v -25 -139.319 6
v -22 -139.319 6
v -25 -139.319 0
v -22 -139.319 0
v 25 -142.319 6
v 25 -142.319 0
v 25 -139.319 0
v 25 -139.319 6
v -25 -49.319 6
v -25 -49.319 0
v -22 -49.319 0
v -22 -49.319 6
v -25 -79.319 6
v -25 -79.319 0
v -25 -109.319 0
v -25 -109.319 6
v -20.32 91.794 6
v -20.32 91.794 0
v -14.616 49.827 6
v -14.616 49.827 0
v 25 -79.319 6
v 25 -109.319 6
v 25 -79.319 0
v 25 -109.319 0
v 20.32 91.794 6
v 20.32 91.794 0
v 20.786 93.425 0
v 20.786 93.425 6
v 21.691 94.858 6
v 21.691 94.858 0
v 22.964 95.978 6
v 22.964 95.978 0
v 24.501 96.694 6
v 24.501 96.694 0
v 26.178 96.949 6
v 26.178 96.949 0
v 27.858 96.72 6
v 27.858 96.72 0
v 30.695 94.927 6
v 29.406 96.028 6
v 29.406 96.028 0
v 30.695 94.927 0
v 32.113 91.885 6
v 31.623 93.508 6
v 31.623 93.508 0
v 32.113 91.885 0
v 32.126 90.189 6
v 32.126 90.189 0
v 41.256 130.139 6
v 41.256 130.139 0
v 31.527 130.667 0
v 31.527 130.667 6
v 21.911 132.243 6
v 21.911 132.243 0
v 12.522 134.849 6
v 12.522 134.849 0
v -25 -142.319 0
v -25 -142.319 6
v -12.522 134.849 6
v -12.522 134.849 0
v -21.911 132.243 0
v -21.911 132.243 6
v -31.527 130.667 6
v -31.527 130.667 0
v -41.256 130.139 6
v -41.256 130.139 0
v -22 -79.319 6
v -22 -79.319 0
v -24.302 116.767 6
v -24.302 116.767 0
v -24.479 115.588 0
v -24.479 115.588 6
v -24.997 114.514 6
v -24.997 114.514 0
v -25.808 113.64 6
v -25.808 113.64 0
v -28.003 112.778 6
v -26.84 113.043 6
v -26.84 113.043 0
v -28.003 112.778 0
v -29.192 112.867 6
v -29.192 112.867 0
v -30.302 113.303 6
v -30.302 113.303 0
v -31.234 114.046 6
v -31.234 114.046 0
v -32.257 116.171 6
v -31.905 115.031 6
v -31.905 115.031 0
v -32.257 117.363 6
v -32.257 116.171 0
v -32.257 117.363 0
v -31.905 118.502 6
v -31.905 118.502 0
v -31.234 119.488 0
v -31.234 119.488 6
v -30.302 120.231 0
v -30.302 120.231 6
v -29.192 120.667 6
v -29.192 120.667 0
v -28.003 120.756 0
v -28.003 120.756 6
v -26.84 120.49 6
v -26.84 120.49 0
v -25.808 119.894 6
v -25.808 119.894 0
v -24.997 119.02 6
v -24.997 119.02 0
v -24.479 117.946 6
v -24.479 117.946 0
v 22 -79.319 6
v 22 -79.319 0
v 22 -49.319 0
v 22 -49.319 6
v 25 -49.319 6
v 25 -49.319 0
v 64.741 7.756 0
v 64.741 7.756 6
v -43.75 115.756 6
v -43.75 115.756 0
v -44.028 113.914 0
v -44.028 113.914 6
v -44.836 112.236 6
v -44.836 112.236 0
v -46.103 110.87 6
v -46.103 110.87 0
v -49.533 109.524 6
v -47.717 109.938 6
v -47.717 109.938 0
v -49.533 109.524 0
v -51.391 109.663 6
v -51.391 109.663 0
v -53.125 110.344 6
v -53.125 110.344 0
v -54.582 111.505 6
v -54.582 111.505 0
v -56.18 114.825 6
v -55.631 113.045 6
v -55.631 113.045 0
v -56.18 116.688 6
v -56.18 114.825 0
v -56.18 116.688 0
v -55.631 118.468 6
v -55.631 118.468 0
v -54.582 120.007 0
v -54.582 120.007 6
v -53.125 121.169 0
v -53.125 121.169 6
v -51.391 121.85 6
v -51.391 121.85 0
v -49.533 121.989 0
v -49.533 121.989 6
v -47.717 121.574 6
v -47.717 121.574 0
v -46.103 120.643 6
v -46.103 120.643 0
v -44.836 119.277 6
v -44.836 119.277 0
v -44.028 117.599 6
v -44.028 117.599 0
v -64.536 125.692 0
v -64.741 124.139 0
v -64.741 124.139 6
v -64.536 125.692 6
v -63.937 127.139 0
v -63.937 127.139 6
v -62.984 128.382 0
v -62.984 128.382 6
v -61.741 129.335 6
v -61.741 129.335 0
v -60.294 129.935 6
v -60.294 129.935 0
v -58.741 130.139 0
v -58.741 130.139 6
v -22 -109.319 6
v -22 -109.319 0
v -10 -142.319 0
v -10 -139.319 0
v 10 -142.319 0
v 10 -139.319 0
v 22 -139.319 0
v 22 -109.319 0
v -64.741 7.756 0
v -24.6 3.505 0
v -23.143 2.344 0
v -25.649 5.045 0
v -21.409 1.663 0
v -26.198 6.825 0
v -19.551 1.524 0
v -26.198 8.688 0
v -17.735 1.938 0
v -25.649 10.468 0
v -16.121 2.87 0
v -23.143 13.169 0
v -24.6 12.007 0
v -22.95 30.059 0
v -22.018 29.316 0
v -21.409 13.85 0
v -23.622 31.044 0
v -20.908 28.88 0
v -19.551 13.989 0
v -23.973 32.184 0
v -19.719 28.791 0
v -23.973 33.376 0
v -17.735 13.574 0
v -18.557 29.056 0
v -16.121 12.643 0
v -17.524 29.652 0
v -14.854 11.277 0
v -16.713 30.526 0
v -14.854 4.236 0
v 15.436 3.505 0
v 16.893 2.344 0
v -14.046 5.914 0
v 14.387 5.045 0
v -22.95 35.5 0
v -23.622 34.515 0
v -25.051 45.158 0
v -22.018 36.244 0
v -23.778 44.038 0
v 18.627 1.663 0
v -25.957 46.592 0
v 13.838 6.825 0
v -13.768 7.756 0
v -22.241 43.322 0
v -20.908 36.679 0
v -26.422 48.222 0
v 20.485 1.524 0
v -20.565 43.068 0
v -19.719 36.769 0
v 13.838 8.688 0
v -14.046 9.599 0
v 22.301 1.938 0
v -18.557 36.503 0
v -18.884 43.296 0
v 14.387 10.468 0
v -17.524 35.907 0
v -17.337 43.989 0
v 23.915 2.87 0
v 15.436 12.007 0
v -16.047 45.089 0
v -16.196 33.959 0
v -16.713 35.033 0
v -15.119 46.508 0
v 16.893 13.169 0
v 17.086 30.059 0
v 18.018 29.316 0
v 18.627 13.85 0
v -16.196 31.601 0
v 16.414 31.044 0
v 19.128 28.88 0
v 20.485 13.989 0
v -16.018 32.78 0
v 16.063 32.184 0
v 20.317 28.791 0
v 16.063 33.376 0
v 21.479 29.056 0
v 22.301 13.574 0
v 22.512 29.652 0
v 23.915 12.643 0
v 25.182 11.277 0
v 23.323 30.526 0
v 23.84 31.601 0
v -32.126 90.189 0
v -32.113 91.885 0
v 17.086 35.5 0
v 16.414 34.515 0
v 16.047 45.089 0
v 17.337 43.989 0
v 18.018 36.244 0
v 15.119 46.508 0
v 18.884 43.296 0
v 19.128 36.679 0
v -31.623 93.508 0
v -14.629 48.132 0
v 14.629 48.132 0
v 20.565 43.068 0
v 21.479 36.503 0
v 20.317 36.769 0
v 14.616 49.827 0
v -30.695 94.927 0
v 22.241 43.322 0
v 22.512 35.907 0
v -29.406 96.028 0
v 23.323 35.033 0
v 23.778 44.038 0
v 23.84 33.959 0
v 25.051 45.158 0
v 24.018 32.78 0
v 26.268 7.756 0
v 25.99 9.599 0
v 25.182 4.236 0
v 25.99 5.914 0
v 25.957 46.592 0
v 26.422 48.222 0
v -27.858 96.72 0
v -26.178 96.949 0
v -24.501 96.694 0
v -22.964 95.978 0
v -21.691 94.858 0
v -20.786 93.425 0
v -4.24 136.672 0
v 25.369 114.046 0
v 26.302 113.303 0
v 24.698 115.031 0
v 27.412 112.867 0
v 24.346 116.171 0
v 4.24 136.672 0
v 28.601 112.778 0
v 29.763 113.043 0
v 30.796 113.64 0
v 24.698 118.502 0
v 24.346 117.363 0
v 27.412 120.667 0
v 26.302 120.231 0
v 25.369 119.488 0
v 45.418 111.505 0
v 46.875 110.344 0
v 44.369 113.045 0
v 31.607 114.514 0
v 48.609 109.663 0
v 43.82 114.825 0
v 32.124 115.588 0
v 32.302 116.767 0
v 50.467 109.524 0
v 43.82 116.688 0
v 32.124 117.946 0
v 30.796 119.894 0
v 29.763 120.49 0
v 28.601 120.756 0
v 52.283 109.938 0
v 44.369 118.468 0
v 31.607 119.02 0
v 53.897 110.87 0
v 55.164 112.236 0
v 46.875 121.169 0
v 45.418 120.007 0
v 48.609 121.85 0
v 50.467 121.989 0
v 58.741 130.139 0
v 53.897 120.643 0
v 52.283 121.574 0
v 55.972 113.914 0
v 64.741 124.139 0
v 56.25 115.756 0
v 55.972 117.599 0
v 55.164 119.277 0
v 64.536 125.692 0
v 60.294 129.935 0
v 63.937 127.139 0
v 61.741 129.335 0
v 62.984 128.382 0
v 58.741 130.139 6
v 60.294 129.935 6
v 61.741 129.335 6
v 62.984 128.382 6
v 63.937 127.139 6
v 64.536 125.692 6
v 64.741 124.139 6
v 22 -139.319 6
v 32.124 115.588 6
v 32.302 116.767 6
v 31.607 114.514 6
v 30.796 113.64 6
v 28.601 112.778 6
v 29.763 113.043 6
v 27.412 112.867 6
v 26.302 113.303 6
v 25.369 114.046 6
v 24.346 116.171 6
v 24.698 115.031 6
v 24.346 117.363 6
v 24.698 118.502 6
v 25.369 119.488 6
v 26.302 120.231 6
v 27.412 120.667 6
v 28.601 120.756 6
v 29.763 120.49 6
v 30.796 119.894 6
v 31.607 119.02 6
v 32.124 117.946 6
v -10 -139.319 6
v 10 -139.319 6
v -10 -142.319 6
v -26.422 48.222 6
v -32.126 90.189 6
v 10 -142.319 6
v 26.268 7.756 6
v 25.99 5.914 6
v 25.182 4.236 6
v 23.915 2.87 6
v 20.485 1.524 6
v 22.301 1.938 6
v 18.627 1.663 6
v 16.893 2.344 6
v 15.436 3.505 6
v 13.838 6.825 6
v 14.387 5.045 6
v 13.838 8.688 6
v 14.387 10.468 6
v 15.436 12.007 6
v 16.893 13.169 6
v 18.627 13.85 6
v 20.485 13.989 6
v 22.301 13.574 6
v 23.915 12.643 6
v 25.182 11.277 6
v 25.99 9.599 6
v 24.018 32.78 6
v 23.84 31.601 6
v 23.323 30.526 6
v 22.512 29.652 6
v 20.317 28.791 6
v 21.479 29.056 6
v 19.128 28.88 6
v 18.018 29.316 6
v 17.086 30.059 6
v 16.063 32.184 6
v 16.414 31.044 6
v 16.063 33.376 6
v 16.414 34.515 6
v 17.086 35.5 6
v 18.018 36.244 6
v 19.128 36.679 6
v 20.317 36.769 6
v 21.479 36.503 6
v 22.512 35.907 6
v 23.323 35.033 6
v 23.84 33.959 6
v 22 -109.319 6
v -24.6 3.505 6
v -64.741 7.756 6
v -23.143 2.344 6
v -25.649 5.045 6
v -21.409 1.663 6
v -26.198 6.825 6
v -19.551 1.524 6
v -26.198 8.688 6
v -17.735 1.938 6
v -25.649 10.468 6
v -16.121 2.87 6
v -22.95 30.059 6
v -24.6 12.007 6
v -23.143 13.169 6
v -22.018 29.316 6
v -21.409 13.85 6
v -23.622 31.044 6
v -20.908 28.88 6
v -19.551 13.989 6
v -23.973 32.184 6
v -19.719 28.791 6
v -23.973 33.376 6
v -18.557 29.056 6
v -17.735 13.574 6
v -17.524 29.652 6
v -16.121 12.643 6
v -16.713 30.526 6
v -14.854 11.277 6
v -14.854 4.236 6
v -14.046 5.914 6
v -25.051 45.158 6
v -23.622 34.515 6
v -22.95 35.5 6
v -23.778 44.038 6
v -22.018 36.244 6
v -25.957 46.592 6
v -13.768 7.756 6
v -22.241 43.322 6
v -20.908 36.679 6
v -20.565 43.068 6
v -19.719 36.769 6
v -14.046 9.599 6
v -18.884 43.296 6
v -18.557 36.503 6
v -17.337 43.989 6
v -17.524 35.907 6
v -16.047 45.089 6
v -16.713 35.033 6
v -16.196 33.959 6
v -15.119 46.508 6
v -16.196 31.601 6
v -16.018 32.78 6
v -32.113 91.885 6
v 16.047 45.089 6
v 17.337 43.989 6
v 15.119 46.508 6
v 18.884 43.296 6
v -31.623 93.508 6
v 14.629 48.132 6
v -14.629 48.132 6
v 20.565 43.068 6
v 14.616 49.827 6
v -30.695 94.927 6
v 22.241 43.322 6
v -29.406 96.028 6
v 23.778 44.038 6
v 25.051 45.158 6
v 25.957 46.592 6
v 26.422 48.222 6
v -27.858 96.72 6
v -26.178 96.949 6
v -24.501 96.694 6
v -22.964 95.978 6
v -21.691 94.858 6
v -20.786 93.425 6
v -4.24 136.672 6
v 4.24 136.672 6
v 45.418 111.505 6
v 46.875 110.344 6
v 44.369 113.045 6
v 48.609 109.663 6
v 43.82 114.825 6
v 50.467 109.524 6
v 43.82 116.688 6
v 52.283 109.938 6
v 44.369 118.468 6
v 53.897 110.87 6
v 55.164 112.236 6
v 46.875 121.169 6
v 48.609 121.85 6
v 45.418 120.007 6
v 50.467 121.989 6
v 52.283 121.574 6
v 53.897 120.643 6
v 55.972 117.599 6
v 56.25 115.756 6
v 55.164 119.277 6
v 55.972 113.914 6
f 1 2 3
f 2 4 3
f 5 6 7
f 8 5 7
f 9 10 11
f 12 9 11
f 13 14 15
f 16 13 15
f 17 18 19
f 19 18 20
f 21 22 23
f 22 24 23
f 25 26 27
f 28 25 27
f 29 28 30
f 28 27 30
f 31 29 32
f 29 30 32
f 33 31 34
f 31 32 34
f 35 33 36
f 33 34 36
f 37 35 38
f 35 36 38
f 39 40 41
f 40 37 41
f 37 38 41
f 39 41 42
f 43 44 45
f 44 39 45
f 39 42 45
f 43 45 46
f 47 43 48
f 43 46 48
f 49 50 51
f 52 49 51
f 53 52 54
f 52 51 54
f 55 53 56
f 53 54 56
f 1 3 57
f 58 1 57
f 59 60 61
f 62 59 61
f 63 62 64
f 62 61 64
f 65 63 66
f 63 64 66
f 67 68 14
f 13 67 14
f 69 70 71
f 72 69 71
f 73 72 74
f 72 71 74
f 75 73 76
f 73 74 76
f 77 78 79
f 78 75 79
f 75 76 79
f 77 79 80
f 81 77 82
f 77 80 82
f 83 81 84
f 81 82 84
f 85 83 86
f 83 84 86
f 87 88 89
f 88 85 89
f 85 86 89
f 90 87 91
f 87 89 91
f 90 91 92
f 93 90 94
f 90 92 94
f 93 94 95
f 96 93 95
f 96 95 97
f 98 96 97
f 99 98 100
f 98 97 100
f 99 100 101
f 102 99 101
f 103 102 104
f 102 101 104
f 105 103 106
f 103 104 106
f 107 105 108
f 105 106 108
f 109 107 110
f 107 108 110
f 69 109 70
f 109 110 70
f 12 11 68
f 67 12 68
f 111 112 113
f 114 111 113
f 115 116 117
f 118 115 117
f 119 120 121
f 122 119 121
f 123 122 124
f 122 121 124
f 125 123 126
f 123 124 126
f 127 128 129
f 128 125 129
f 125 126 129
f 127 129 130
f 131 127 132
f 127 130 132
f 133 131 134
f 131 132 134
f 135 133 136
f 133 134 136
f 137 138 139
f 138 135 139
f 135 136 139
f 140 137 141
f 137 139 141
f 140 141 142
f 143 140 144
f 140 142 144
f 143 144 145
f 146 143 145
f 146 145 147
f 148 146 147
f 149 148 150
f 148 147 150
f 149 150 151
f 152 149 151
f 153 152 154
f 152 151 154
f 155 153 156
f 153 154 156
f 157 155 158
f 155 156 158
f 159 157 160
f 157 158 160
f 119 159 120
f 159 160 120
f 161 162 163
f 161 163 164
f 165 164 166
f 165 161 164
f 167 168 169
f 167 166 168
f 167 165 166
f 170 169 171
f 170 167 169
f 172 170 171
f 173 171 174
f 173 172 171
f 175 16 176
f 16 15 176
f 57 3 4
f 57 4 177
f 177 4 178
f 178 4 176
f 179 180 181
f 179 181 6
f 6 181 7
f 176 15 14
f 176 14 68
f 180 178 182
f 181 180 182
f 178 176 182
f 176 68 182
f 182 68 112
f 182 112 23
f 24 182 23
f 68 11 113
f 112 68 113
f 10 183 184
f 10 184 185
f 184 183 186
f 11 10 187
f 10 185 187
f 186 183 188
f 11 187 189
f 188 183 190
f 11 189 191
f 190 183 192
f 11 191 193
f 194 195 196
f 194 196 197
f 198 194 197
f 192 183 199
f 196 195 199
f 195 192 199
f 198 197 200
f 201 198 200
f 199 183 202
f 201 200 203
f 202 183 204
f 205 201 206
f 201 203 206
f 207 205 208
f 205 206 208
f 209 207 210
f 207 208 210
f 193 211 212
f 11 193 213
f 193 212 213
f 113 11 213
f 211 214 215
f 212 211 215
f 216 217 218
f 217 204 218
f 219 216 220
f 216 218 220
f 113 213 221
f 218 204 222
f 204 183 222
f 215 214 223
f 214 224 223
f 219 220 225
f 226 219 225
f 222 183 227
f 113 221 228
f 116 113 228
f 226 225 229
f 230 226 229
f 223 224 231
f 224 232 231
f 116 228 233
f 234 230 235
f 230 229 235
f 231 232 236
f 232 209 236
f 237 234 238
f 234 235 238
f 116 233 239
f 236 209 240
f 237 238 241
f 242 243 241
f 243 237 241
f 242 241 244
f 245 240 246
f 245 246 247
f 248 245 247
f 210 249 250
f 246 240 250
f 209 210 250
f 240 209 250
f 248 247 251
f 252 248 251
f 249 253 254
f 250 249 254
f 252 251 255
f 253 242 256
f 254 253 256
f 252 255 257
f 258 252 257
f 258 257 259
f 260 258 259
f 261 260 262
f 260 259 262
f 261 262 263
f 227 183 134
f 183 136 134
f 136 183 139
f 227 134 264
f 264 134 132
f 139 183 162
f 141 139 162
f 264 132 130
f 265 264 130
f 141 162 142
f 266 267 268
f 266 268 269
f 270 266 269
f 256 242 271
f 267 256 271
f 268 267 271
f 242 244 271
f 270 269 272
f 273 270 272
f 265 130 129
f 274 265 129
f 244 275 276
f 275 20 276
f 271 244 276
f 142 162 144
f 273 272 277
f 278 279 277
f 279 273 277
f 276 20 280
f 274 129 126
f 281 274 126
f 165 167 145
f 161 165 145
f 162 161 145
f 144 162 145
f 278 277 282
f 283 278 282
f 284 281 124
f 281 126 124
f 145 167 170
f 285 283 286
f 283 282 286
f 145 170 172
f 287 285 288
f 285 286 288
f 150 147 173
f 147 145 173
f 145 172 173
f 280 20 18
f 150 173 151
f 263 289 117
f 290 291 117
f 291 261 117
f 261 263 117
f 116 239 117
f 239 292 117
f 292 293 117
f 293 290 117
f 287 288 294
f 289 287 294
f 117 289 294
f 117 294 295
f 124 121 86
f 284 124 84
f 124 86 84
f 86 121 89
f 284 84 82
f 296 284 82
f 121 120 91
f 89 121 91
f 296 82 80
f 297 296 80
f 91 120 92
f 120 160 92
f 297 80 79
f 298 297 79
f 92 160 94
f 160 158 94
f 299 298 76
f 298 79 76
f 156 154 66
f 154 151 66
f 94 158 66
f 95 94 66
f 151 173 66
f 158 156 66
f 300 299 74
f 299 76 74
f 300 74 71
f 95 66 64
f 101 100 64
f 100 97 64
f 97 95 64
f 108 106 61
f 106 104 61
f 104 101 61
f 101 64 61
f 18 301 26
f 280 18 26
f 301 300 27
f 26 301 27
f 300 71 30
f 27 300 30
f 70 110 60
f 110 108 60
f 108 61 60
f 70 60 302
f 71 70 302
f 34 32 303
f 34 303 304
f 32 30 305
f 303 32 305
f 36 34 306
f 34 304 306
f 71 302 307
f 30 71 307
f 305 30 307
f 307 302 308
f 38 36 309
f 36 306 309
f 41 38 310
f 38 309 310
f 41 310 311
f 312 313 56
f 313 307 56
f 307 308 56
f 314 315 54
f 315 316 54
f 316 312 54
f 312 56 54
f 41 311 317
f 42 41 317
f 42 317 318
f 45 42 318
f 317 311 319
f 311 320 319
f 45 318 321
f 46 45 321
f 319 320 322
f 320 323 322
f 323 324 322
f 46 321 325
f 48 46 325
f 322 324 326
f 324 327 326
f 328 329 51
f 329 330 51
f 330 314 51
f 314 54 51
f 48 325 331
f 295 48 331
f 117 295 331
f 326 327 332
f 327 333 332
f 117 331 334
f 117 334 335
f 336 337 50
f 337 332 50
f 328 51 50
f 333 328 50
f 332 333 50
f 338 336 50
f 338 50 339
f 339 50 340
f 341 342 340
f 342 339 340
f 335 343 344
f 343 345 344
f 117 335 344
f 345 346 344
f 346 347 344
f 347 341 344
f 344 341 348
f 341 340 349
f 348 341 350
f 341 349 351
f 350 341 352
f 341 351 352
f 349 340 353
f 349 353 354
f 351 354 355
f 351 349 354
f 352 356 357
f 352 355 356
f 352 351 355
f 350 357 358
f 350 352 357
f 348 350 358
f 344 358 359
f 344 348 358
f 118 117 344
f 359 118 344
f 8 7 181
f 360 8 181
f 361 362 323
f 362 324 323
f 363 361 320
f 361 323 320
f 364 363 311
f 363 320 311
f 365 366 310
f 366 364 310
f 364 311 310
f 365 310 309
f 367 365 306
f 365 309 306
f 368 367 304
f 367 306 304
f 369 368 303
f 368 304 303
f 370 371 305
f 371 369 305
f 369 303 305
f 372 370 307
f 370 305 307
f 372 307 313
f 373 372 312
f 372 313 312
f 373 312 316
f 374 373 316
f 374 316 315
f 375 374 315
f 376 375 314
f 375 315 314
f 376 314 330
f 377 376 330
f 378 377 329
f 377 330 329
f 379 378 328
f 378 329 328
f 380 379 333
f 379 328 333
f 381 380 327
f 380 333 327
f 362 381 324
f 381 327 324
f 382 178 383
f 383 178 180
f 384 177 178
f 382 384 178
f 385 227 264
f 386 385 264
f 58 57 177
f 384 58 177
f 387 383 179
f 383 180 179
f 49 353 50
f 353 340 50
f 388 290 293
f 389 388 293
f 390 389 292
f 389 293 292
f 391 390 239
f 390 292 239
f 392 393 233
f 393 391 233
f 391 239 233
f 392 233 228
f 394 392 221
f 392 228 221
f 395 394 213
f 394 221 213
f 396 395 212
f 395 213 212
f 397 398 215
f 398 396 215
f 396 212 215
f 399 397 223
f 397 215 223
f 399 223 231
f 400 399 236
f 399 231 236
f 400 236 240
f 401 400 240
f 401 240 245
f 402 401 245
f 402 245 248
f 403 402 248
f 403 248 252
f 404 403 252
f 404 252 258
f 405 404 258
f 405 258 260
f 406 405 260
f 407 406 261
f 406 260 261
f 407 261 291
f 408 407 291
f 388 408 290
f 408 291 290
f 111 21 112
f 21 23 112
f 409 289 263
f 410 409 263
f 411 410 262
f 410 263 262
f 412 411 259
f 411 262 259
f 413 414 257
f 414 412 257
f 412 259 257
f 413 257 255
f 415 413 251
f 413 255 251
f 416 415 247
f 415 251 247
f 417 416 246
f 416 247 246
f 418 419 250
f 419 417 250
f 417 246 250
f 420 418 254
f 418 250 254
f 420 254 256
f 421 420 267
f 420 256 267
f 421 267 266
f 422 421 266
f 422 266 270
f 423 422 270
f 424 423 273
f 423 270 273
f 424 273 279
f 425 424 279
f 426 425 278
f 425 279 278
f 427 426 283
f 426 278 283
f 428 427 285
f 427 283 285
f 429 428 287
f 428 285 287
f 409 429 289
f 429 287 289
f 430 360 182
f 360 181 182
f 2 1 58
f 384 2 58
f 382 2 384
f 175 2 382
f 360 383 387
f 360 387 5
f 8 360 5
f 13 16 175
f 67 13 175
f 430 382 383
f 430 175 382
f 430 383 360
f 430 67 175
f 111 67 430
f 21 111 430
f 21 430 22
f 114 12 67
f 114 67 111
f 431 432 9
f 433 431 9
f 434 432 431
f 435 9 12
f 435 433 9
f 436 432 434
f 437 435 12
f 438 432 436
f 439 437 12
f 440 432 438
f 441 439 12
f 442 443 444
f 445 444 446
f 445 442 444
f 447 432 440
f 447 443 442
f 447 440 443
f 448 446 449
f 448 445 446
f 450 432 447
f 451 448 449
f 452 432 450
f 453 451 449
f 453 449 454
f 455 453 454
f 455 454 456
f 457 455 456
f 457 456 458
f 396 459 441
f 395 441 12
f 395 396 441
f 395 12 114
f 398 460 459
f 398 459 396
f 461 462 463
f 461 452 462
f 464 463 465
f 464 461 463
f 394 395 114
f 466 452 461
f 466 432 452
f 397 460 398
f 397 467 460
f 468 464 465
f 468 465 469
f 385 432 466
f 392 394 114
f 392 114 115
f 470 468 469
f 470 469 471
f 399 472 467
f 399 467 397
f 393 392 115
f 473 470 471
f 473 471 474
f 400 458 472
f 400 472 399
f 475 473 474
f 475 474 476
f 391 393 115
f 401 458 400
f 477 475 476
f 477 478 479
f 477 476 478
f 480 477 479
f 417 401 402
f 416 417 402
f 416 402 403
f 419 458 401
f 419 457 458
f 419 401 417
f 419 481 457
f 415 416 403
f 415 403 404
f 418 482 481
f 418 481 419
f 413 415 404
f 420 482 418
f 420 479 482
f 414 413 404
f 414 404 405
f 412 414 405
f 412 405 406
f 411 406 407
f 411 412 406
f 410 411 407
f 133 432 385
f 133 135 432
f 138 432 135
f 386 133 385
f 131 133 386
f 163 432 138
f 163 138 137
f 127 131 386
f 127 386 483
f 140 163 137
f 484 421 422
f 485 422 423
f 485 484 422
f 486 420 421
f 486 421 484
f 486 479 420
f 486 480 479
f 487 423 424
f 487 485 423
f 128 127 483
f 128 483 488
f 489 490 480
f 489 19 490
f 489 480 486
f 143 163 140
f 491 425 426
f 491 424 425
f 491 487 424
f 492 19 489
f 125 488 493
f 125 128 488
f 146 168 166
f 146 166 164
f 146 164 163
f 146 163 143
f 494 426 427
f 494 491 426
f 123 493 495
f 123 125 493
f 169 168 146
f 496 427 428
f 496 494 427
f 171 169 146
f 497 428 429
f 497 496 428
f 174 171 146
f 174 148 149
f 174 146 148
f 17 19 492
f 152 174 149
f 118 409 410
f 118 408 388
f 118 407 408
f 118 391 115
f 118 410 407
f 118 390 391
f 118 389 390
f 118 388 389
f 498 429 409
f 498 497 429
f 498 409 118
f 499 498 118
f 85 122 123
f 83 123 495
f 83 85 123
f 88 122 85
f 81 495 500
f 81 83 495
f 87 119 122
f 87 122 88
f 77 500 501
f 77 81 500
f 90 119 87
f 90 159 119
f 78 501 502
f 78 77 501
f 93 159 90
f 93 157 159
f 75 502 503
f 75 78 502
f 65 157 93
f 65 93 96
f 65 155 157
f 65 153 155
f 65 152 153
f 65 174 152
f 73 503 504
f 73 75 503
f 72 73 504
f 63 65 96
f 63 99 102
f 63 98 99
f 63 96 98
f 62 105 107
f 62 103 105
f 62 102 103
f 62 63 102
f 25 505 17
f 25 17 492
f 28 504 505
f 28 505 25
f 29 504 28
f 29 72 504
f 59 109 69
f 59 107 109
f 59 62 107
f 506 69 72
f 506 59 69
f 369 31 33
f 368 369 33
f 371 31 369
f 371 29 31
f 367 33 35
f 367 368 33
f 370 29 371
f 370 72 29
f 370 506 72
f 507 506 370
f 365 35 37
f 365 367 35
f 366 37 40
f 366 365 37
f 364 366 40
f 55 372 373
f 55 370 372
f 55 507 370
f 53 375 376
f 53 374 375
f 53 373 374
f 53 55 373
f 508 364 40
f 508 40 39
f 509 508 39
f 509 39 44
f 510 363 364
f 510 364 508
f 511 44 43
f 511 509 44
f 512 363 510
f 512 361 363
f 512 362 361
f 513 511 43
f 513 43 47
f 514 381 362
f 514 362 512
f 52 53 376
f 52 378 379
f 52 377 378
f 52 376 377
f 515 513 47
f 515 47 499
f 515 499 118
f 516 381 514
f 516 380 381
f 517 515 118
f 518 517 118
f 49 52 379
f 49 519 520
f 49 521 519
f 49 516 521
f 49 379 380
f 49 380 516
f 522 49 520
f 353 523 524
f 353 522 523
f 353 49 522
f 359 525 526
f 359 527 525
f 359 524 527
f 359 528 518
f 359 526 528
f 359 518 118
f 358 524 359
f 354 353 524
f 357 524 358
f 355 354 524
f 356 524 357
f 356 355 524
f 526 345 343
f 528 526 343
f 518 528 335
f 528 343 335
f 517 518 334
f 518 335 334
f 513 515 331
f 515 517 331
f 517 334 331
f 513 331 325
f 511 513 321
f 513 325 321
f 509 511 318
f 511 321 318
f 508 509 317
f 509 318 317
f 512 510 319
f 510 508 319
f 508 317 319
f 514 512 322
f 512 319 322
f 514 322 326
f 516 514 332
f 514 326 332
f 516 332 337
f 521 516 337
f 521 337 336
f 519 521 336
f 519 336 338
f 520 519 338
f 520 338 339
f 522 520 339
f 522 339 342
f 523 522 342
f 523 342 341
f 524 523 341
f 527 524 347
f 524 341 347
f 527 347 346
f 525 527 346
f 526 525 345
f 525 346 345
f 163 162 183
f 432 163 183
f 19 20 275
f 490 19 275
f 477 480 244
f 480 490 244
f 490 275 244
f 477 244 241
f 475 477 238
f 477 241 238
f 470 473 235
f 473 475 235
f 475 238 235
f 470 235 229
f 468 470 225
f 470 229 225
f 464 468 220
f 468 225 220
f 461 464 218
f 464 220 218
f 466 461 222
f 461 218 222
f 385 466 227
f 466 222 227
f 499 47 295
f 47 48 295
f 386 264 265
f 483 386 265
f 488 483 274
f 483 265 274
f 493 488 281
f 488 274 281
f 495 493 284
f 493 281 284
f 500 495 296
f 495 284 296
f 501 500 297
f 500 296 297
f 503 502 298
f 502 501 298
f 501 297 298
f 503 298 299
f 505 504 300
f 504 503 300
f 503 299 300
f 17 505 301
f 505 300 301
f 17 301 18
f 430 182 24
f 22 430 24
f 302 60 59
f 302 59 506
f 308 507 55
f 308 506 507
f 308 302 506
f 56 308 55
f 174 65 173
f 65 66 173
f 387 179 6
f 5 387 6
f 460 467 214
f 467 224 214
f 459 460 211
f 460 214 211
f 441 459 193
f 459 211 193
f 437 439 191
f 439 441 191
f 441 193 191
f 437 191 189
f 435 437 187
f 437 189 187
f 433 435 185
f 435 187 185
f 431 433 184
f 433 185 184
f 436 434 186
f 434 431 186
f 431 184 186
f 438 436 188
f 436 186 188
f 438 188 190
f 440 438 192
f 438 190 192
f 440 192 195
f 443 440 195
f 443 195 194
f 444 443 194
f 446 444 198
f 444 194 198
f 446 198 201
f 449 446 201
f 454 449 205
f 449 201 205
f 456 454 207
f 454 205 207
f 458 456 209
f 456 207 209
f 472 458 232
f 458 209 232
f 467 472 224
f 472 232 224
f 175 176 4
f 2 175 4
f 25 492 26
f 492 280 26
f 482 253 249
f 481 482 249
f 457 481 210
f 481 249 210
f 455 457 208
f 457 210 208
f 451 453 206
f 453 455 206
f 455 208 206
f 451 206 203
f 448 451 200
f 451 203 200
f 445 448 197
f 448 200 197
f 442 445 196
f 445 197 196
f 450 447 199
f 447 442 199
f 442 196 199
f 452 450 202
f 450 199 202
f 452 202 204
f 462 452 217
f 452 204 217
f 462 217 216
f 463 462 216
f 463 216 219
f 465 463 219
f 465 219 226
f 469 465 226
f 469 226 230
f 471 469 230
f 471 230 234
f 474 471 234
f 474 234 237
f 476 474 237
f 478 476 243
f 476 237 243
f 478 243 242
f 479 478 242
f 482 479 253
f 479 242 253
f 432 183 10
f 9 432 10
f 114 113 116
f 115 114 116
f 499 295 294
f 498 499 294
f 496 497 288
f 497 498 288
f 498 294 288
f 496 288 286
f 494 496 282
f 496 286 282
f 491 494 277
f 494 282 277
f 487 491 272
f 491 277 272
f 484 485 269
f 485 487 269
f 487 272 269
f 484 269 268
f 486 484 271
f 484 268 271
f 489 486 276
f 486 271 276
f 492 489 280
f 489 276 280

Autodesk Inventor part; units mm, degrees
ref_plane "YZ Plane" through (0, 0, 0) normal (1, 0, 0) x (0, 1, 0)
ref_plane "XZ Plane" through (0, 0, 0) normal (0, 1, 0) x (-1, 0, 0)
ref_plane "XY Plane" through (0, 0, 0) normal (0, 0, 1) x (1, 0, 0)
sketch "Sketch1" plane through (0, 0, 0) normal (0, 0, 1) x (1, 0, 0)
  line L0 (-10, -142.3192) -> (-10, -139.3192) projected
  line L1 (-10, -139.3192) -> (10, -139.3192) projected
  line L2 (10, -139.3192) -> (10, -142.3192) projected
  line L3 (10, -142.3192) -> (25, -142.3192) projected
  line L4 (25, -142.3192) -> (25, -139.3192) projected
  line L5 (25, -139.3192) -> (22, -139.3192) projected
  line L6 (22, -139.3192) -> (22, -109.3192) projected
  line L7 (22, -109.3192) -> (25, -109.3192) projected
  line L8 (25, -109.3192) -> (25, -79.3192) projected
  line L9 (25, -79.3192) -> (22, -79.3192) projected
  line L10 (22, -79.3192) -> (22, -49.3192) projected
  line L11 (22, -49.3192) -> (25, -49.3192) projected
  line L12 (25, -49.3192) -> (64.7409, 7.7563) projected
  line L13 (64.7409, 7.7563) -> (64.7409, 124.1392) projected
  arc A0 (64.7409, 124.1392) -> (58.7409, 130.1392) centre (58.7409, 124.1392) ccw projected
  line L14 (58.7409, 130.1392) -> (41.2562, 130.1392) projected
  arc A1 (12.5221, 134.8494) -> (41.2562, 130.1392) centre (41.2562, 220.1392) ccw projected
  arc A2 (12.5221, 134.8494) -> (-12.5221, 134.8494) centre (0, 97.6808) ccw projected
  arc A3 (-41.2562, 130.1392) -> (-12.5221, 134.8494) centre (-41.2562, 220.1392) ccw projected
  line L15 (-41.2562, 130.1392) -> (-58.7409, 130.1392) projected
  arc A4 (-58.7409, 130.1392) -> (-64.7409, 124.1392) centre (-58.7409, 124.1392) ccw projected
  line L16 (-64.7409, 124.1392) -> (-64.7409, 7.7563) projected
  line L17 (-64.7409, 7.7563) -> (-25, -49.3192) projected
  line L18 (-25, -49.3192) -> (-22, -49.3192) projected
  line L19 (-22, -49.3192) -> (-22, -79.3192) projected
  line L20 (-22, -79.3192) -> (-25, -79.3192) projected
  line L21 (-25, -79.3192) -> (-25, -109.3192) projected
  line L22 (-25, -109.3192) -> (-22, -109.3192) projected
  line L23 (-22, -109.3192) -> (-22, -139.3192) projected
  line L24 (-22, -139.3192) -> (-25, -139.3192) projected
  line L25 (-25, -139.3192) -> (-25, -142.3192) projected
  line L26 (-25, -142.3192) -> (-10, -142.3192) projected
  circle A5 centre (-50, 115.7563) radius 3.25 projected
  circle A6 centre (50, 115.7563) radius 3.25 projected
  circle A7 centre (20.018, 7.7563) radius 3.25 projected
  circle A8 centre (-20.018, 7.7563) radius 3.25 projected
  circle A9 centre (-28.3016, 116.7669) radius 4 projected
  circle A10 centre (-20.018, 32.7797) radius 4 projected
  circle A11 centre (20.018, 32.7797) radius 4 projected
  circle A12 centre (28.3016, 116.7669) radius 4 projected
  line L27 (32.1264, 90.1891) -> (26.4217, 48.2224) projected
  arc A13 (14.6157, 49.8272) -> (26.4217, 48.2224) centre (20.5187, 49.0248) ccw projected
  line L28 (14.6157, 49.8272) -> (20.3204, 91.794) projected
  arc A14 (32.1264, 90.1891) -> (20.3204, 91.794) centre (26.2234, 90.9915) ccw projected
  line L29 (-20.3204, 91.794) -> (-14.6157, 49.8272) projected
  arc A15 (-26.4217, 48.2224) -> (-14.6157, 49.8272) centre (-20.5187, 49.0248) ccw projected
  line L30 (-26.4217, 48.2224) -> (-32.1264, 90.1891) projected
  arc A16 (-20.3204, 91.794) -> (-32.1264, 90.1891) centre (-26.2234, 90.9915) ccw projected
  circle A17 centre (50, 115.7563) radius 6.25
  circle A18 centre (-50, 115.7563) radius 6.25
  circle A19 centre (20.018, 7.7563) radius 6.25
  circle A20 centre (-20.018, 7.7563) radius 6.25
  point P0 (0, 0)
  dimension "d0" = 3
  dimension "d1" = 3
  dimension "d2" = 3
  dimension "d3" = 3
extrude "Extrusion1" add sketch "Sketch1" along normal blind 6 contours L26 L25 L24 L23 L22 L21 L20 L19 L18 L17 L16 A4 L15 A3 A2 A1 L14 A0 L13 L12 L11 L10 L9 L8 L7 L6 L5 L4 L3 L2 L1 L0
properties part number "Camera stand plate base"
